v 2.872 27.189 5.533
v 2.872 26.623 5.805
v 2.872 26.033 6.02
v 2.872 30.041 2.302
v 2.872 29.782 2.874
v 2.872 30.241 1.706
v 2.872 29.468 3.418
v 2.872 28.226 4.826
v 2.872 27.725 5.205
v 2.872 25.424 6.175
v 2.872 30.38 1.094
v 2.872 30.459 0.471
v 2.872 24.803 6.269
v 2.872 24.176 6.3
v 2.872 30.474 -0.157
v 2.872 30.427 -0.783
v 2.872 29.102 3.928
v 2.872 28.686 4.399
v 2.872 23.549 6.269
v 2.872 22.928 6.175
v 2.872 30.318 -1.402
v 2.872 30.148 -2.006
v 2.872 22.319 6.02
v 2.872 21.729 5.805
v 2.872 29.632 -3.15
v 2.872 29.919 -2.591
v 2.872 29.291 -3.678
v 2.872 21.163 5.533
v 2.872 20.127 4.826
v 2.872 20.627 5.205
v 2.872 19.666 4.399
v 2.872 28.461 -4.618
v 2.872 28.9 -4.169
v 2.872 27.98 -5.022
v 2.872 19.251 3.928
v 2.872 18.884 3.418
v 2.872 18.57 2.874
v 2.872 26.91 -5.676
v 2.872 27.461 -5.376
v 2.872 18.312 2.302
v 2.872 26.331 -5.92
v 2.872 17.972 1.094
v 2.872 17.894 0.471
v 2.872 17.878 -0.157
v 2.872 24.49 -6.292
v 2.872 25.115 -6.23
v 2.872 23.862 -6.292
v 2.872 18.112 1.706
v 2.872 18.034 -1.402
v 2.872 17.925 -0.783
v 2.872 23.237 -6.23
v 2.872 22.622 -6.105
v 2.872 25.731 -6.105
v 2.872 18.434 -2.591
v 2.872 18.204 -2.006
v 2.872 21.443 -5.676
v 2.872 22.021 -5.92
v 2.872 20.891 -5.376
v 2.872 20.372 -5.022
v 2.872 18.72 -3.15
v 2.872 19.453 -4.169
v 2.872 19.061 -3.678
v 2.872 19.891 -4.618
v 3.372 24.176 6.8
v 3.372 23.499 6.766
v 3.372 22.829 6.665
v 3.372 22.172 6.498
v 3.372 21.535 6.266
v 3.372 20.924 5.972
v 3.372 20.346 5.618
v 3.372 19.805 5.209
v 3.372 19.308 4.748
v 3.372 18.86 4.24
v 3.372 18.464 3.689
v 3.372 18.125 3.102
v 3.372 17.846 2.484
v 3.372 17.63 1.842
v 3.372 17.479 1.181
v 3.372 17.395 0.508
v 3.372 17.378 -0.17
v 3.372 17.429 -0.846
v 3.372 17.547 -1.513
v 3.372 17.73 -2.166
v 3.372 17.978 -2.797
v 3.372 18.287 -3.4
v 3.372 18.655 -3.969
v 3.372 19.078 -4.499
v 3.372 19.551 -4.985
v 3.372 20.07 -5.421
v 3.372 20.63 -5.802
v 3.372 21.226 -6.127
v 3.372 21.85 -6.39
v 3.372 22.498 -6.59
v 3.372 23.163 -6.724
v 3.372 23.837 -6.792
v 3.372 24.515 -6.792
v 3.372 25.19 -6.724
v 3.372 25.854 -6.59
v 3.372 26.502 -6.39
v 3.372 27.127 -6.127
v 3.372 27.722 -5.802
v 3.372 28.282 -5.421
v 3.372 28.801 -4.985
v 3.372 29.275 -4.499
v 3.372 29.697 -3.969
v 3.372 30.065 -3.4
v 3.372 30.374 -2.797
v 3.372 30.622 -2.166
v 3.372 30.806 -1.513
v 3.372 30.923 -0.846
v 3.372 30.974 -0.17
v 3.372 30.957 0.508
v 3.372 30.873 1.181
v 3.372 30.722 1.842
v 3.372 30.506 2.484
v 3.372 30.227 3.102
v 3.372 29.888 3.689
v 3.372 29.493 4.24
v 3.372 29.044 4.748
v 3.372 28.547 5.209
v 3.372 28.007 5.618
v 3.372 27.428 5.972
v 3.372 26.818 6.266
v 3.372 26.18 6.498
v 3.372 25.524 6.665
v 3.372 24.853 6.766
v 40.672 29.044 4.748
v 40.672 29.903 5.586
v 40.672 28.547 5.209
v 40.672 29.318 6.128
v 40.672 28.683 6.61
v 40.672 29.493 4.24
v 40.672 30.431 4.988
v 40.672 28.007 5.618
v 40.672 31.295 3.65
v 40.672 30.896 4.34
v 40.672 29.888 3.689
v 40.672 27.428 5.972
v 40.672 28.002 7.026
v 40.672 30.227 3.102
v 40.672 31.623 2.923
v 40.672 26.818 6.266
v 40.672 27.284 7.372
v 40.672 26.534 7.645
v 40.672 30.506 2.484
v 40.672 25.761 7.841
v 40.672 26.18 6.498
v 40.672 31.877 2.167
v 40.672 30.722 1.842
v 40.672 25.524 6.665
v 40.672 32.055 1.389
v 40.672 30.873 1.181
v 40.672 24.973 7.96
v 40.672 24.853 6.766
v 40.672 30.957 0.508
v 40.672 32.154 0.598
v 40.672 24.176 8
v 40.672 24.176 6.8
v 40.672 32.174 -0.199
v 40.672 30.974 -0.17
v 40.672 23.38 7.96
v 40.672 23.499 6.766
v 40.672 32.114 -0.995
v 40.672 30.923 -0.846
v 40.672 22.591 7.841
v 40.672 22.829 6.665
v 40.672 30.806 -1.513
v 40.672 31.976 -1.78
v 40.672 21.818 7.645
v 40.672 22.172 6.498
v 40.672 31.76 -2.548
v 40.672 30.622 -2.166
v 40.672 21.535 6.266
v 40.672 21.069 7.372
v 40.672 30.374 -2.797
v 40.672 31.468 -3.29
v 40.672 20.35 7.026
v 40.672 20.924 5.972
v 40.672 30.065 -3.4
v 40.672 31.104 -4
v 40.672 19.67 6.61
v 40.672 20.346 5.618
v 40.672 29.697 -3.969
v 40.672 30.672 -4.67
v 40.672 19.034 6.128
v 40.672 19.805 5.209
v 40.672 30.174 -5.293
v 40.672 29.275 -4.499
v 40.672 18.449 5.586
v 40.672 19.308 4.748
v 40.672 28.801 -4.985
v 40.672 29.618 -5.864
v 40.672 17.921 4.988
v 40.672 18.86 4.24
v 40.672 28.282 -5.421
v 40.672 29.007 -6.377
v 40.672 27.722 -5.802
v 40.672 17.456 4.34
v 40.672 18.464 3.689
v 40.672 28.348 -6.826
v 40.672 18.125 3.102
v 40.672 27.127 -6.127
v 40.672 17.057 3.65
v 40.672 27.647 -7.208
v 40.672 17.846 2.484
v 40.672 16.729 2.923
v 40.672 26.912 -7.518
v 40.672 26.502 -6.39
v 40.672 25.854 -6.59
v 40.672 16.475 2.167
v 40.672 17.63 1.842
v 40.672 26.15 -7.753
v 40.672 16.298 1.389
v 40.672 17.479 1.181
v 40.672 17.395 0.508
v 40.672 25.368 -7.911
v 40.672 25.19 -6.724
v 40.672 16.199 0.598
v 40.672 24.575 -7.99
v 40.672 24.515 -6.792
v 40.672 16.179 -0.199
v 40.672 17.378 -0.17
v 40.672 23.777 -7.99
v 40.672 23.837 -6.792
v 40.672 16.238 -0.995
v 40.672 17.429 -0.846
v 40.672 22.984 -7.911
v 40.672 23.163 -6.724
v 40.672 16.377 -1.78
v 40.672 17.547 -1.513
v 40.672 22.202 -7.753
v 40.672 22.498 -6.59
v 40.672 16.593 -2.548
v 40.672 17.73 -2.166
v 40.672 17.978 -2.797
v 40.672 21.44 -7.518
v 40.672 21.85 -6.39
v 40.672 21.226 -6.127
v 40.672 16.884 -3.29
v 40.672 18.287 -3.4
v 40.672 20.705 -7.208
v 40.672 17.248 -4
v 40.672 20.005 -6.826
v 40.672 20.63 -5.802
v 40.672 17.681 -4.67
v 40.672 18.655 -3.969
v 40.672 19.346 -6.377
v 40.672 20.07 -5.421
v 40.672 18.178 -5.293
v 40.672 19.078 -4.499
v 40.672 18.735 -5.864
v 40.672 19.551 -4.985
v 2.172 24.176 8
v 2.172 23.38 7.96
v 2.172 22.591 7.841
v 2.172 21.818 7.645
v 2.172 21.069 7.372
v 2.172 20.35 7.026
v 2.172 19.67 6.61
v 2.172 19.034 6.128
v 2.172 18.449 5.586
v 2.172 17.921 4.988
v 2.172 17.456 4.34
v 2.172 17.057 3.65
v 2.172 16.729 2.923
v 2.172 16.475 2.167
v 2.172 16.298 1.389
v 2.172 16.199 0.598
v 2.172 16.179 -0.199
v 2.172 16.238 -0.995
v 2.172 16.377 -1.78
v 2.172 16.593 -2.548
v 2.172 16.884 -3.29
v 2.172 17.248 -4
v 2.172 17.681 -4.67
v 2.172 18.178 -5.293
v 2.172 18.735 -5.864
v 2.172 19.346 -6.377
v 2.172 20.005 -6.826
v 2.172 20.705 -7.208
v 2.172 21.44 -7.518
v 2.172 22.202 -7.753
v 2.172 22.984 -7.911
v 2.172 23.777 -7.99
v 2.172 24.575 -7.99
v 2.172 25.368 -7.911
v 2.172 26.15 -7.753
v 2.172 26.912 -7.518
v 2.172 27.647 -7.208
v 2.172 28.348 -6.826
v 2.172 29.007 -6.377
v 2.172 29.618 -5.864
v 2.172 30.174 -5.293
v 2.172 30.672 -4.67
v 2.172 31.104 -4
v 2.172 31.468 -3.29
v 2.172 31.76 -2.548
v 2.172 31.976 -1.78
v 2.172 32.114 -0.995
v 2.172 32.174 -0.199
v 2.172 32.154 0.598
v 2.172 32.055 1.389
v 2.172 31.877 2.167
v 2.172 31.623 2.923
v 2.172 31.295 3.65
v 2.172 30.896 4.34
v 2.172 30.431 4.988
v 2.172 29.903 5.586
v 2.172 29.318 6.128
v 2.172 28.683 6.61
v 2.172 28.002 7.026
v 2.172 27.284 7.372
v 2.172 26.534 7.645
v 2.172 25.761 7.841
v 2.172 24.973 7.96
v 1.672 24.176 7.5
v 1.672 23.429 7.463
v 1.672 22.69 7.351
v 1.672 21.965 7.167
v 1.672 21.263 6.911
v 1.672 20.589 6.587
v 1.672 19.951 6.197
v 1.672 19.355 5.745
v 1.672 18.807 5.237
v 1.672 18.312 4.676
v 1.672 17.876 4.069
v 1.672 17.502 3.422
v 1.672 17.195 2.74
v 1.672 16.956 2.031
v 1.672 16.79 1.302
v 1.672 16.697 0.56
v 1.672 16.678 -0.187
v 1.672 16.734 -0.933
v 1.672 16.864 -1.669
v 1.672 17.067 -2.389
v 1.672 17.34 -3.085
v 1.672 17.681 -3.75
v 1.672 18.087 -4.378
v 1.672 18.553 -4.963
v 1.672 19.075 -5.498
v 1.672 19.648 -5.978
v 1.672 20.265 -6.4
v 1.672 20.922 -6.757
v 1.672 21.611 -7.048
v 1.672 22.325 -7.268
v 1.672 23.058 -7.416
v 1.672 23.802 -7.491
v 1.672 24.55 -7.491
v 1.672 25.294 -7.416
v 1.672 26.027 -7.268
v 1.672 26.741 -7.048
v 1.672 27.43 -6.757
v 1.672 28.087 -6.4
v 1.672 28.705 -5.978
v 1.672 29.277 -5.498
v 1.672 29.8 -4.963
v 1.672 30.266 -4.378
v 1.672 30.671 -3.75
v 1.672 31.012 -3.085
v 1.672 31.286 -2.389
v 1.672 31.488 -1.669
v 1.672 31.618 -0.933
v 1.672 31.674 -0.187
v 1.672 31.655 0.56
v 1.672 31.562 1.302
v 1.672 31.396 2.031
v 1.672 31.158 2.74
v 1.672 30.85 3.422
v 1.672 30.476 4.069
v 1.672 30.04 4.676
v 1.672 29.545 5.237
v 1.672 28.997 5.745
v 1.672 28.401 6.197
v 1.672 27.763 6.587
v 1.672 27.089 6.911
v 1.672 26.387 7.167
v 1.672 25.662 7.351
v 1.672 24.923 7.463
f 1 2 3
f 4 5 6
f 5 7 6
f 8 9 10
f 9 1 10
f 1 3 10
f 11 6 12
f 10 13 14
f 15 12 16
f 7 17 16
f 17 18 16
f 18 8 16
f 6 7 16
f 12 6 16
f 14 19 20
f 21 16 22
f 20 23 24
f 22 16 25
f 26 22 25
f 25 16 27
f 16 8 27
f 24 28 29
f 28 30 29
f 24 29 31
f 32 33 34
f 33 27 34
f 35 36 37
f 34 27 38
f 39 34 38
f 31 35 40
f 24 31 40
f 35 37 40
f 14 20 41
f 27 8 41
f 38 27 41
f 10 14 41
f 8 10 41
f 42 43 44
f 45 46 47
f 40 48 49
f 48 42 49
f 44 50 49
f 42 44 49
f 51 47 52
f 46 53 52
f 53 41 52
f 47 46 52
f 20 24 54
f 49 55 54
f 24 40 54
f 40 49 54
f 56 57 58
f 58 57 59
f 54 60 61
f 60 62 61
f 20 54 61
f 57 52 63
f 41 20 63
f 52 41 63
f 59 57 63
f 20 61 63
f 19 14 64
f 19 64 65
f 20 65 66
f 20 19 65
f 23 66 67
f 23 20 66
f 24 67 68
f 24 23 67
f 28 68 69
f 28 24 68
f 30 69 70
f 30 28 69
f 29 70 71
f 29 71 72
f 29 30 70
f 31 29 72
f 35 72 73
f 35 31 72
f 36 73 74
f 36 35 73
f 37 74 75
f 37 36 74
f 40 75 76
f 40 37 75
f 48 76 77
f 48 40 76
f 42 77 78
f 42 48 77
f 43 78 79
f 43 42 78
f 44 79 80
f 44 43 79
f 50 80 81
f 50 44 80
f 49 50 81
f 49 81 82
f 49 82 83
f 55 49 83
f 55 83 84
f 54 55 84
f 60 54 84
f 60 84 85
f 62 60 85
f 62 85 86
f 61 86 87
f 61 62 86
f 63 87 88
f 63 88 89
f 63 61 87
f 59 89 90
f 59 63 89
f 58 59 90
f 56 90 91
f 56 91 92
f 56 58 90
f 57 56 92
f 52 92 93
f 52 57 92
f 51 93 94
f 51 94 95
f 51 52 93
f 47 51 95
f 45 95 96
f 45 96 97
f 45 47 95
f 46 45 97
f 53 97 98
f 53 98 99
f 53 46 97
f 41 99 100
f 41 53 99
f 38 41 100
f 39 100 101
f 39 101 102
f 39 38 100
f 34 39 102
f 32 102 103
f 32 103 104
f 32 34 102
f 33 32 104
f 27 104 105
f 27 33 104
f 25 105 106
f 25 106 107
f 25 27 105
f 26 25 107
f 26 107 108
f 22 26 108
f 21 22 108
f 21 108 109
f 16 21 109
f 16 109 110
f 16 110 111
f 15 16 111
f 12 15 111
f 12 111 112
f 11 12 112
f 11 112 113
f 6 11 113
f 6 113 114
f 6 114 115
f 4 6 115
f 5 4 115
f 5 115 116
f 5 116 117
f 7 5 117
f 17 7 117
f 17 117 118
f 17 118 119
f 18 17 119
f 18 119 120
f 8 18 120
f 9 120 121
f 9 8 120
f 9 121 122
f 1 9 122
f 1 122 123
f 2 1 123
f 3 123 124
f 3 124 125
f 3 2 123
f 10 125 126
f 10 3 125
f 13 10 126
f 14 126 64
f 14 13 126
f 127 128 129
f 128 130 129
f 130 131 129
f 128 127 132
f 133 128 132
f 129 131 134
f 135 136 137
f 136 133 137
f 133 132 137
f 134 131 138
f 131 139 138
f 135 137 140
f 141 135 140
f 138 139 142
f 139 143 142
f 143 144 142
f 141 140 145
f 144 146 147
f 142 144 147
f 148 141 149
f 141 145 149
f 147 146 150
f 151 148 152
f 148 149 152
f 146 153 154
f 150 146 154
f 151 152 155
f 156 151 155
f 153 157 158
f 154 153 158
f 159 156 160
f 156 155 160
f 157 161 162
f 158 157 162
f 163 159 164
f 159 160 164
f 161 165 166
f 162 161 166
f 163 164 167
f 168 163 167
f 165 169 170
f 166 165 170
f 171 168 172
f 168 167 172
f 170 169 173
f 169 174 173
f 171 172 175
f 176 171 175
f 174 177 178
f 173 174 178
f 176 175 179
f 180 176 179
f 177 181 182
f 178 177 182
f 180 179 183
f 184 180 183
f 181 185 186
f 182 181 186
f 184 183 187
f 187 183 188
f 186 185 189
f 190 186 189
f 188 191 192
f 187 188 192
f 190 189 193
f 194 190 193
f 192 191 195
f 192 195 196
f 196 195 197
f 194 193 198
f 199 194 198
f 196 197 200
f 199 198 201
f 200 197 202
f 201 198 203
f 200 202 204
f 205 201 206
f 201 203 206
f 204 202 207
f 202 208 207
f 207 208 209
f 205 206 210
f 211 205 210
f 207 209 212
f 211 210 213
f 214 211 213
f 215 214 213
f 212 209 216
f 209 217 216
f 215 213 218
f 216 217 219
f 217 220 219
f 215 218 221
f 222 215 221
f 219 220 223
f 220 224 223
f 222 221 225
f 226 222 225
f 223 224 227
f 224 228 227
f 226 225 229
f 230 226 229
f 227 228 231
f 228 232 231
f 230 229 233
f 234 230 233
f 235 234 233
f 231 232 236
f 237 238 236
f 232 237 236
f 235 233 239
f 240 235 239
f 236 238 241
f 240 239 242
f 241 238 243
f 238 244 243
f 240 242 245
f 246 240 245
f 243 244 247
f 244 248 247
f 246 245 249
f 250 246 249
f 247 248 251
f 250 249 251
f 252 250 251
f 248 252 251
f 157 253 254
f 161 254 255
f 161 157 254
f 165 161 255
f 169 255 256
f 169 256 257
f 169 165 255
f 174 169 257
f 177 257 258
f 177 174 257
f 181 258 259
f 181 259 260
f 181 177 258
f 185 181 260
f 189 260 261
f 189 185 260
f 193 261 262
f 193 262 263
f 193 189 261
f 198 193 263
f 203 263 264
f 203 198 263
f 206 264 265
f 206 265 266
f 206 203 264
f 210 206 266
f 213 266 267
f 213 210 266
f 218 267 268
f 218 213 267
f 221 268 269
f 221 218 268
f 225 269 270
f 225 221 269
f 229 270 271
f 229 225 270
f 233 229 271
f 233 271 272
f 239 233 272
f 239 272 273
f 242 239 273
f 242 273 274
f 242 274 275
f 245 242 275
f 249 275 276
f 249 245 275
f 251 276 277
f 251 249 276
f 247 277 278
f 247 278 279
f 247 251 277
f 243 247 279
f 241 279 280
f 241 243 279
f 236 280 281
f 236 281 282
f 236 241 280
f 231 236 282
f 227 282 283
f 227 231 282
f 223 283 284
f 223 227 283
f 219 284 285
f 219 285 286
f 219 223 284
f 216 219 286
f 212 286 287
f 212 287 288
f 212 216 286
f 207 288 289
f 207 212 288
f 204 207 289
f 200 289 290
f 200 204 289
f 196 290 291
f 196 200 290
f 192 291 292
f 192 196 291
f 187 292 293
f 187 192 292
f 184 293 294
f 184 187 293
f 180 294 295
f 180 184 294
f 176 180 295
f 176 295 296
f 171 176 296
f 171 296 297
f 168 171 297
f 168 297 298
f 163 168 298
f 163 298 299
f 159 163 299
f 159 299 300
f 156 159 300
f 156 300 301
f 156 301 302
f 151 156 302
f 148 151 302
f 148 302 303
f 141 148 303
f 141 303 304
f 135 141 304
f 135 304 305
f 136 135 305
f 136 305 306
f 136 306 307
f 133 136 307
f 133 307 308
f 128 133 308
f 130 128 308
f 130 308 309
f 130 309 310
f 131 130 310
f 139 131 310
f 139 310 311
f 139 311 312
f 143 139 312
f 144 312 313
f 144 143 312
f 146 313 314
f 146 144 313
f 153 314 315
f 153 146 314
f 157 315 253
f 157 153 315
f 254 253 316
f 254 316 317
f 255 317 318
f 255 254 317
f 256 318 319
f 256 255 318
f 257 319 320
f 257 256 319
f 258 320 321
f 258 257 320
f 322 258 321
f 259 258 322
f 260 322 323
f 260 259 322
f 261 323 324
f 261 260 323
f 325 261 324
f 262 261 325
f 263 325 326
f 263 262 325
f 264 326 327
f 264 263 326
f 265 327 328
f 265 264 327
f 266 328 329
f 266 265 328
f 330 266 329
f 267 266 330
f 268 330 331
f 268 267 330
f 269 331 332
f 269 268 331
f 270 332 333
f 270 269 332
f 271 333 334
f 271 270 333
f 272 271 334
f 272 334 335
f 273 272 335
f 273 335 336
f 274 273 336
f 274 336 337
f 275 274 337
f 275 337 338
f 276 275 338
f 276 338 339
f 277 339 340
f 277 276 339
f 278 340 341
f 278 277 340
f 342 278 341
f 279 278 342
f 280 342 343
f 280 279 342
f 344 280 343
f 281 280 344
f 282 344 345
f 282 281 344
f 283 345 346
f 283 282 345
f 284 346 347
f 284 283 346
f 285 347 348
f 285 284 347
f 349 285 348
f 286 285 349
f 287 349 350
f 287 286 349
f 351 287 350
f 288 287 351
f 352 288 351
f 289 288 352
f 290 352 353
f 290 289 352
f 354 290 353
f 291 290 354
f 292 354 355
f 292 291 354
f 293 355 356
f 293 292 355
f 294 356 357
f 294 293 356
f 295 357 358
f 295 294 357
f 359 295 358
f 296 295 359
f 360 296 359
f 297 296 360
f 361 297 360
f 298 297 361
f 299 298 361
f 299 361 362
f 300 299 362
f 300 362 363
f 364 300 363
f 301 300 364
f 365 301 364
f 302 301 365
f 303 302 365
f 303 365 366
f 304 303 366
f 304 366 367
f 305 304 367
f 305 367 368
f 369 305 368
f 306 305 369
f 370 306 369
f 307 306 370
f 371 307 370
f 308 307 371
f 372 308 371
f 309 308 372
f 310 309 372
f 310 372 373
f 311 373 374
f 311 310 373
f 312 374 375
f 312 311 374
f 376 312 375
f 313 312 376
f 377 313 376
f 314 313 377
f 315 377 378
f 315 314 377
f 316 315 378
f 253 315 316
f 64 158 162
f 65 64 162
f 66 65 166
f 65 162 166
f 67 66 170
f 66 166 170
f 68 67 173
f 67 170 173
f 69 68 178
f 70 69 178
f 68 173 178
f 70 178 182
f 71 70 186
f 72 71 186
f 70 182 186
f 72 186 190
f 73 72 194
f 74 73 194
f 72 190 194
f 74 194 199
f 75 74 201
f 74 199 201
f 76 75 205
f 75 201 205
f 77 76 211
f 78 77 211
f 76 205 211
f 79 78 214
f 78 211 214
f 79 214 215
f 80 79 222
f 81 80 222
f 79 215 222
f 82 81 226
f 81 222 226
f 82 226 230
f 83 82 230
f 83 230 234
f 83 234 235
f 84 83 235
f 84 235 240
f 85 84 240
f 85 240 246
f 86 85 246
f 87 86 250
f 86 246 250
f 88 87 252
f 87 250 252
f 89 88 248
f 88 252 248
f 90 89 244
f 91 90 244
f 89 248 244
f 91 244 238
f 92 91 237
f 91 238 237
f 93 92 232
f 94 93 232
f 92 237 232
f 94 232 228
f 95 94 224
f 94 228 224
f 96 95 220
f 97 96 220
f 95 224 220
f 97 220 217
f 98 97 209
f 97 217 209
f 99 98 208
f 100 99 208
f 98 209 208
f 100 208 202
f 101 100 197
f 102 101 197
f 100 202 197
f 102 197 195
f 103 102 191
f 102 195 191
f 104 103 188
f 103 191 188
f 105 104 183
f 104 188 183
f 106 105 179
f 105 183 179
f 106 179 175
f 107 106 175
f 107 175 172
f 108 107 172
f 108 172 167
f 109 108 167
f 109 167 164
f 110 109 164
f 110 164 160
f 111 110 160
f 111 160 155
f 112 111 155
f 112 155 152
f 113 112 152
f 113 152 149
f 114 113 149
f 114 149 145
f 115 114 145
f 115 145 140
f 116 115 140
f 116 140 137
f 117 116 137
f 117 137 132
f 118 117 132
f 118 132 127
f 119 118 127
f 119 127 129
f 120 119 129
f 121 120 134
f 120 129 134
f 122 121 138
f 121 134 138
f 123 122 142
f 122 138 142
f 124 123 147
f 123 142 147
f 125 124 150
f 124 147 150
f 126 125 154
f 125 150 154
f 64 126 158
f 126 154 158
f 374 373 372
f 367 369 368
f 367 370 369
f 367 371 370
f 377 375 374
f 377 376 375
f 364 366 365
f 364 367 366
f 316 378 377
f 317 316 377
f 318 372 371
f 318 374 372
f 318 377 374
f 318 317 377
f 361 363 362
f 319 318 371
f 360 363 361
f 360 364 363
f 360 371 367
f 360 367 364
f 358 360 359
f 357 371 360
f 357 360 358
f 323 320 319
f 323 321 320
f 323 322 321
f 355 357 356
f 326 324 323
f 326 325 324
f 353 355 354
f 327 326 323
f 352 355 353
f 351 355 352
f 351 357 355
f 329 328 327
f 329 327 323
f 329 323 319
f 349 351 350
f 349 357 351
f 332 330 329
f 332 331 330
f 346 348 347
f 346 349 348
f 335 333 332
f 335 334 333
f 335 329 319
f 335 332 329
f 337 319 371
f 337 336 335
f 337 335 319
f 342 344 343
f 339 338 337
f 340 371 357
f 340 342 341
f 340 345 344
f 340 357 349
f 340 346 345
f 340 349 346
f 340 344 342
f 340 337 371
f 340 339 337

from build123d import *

# Parameters (mm, degrees)
SKETCH_2_W     = 39
SKETCH_2_H     = 8
SHELL_4_T      = -1.2
CHAMFER_2_SIZE = 0.5


with BuildPart() as part:
    # 草图2 → 旋转2 (revolve)
    with BuildSketch(Plane(origin=(0, 17.555203641, 0), x_dir=(1, 0, 0), z_dir=(0, 0, 1)), mode=Mode.PRIVATE) as revolve_2_sk:
        with Locations((21.172378693, 10.620939958)):
            Rectangle(SKETCH_2_W, SKETCH_2_H)
    revolve(revolve_2_sk.sketch.rotate(Axis((1.672378693, 24.176143599, 0), (1, 0, 0)), 90), axis=Axis((1.672378693, 24.176143599, 0), (1, 0, 0)))

    # 抽壳4
    shell_4_openings = [part.faces().sort_by_distance(p)[0] for p in [
        (40.672378693, 24.176143599, 0),
    ]]
    offset(amount=SHELL_4_T, openings=shell_4_openings, kind=Kind.INTERSECTION)

    # 倒角2
    chamfer_2_edges = [part.edges().sort_by_distance(p)[0] for p in [
        (2.872378693, 24.176143599, -6.8),
        (1.672378693, 24.176143599, -8),
    ]]
    chamfer(chamfer_2_edges, length=CHAMFER_2_SIZE)


solid = part.part
